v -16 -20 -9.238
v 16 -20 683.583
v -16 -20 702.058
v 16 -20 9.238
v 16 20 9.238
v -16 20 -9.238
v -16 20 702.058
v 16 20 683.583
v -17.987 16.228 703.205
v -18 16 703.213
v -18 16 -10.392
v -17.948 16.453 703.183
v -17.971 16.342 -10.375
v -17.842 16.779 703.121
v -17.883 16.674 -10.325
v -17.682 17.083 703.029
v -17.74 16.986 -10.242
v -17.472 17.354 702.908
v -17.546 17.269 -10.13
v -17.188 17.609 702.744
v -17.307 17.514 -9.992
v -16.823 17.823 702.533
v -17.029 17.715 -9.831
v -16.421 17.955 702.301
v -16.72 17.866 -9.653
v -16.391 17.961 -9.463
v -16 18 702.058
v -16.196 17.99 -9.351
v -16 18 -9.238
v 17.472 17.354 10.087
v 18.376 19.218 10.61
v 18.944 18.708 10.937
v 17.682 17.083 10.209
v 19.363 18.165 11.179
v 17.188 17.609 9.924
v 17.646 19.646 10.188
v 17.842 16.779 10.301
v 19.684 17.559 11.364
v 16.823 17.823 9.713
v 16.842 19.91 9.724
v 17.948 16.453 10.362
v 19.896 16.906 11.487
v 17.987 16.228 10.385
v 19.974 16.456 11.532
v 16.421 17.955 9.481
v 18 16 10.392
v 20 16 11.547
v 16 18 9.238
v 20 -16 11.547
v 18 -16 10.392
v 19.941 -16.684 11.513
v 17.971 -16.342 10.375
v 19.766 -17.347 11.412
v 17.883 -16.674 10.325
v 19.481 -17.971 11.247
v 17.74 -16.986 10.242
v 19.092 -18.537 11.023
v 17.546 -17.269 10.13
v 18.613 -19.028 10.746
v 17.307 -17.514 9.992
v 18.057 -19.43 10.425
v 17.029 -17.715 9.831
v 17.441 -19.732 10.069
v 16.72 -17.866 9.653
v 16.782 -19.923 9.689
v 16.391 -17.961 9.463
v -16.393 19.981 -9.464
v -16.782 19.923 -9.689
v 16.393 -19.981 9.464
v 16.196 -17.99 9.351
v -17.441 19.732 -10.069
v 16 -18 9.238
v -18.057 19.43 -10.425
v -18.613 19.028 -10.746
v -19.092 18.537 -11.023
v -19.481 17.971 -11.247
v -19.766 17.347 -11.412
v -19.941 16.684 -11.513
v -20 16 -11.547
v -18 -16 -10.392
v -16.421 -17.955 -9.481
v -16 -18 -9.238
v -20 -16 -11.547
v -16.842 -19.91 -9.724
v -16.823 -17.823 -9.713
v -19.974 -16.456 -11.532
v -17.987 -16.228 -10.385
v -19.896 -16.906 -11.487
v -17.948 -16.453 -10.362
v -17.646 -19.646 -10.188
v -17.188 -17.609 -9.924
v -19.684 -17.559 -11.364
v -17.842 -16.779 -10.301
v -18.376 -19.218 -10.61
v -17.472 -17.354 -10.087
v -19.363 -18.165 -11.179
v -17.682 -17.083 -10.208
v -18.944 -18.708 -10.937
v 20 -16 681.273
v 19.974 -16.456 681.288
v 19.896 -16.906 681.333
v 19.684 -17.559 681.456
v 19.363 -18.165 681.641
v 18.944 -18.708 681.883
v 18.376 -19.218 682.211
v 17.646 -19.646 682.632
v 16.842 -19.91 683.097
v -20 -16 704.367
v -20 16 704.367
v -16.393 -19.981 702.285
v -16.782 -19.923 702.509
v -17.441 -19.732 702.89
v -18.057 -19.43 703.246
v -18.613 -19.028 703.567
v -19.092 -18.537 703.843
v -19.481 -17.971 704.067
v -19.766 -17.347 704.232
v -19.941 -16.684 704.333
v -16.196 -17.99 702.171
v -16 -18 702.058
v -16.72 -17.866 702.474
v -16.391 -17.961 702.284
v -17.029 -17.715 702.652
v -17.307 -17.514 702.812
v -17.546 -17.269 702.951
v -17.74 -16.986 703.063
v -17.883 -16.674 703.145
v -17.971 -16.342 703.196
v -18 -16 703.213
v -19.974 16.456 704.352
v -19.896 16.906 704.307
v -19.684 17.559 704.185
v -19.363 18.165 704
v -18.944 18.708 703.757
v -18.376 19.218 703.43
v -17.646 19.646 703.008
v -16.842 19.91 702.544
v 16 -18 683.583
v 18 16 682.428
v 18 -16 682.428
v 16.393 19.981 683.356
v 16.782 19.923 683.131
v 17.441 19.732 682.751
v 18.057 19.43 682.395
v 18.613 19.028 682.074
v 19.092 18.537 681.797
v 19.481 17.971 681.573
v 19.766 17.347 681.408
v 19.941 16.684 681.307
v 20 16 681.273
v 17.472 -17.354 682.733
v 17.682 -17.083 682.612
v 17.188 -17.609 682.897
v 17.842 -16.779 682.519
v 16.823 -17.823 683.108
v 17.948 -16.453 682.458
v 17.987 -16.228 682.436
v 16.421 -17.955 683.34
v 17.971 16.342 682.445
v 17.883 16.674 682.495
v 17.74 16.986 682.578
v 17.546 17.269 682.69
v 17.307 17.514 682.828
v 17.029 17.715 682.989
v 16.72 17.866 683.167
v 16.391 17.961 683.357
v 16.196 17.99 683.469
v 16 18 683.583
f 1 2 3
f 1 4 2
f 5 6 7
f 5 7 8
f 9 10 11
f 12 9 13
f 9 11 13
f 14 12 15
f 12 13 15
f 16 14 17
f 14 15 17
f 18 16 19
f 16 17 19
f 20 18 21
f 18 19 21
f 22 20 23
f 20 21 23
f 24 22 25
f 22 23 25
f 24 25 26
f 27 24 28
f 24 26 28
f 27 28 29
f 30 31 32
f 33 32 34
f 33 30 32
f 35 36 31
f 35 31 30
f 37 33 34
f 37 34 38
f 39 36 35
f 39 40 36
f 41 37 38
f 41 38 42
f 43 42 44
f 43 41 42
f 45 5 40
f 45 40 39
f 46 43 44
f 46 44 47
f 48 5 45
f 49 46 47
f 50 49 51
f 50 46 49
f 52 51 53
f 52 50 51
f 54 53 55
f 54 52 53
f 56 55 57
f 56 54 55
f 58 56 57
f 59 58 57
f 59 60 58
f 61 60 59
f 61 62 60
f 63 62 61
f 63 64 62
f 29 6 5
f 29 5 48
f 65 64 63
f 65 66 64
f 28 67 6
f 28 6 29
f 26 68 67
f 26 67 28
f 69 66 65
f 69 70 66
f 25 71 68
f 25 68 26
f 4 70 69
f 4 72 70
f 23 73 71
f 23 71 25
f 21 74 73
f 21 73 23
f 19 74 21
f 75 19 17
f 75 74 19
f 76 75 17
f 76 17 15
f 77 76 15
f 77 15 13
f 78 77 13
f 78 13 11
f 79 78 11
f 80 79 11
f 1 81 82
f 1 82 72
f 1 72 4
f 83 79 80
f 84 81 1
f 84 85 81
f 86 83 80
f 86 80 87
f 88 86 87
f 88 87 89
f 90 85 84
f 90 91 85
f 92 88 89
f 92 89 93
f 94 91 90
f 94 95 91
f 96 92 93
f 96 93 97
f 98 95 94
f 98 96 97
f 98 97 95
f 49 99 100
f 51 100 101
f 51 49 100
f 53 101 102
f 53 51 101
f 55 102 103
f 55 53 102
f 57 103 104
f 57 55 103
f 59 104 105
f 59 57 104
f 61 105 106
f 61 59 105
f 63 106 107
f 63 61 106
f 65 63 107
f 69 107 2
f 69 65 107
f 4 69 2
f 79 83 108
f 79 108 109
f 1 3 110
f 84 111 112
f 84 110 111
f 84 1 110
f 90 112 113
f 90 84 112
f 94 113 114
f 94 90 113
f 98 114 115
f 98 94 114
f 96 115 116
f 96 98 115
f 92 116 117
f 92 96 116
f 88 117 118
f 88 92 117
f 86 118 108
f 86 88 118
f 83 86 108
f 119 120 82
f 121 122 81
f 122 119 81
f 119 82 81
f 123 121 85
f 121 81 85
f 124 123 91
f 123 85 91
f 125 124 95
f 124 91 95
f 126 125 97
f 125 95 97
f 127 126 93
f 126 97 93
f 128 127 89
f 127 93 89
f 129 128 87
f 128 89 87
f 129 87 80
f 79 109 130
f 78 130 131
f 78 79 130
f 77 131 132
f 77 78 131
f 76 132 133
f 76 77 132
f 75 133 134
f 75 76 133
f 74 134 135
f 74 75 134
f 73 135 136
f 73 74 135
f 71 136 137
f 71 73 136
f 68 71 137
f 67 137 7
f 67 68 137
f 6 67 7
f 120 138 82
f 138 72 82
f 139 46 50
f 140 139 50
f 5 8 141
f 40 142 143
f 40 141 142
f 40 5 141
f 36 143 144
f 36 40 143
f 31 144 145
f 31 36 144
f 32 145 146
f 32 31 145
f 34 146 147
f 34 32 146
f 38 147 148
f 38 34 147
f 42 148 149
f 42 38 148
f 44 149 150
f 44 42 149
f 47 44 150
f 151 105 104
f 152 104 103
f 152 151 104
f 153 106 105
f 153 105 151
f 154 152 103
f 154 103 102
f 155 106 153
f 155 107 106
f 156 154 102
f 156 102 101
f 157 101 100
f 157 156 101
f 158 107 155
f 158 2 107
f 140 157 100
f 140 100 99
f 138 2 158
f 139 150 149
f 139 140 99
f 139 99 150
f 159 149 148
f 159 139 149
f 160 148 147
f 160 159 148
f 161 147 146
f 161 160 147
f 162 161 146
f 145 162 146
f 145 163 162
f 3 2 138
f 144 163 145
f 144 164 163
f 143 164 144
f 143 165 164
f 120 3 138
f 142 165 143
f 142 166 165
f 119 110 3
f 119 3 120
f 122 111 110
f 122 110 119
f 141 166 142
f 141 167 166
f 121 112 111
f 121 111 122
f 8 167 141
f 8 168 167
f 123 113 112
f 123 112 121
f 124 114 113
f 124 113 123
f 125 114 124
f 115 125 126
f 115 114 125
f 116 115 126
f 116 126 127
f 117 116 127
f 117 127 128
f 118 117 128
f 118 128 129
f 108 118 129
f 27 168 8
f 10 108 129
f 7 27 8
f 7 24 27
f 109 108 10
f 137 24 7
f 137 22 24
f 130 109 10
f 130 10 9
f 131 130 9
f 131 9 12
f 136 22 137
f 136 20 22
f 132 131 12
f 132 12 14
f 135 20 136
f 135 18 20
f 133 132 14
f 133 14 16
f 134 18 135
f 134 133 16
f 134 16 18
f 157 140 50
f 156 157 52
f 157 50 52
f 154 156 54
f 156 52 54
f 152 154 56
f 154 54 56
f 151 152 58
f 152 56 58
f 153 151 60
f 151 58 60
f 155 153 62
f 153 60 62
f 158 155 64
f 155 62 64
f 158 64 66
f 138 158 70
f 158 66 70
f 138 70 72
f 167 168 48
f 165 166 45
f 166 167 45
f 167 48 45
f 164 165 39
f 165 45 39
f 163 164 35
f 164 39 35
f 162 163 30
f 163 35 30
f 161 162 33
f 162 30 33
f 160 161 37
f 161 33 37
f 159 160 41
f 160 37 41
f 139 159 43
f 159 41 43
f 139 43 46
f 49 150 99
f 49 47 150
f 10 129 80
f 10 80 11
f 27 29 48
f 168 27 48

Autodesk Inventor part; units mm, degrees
ref_plane "Start Plane" through (0, 0, -11.547) normal (0, 0, 1) x (1, 0, 0)
ref_plane "End Plane" through (0, 0, 704.3673) normal (0, 0, 1) x (1, 0, 0)
sketch "Sketch" plane through (0, 0, 0) normal (0, 0, 1) x (1, 0, 0)
  line L0 (-20, -16) -> (-20, 16)
  line L1 (-16, 20) -> (16, 20)
  line L2 (20, 16) -> (20, -16)
  line L3 (16, -20) -> (-16, -20)
  arc A0 (-20, -16) -> (-16, -20) centre (-16, -16) ccw
  arc A1 (20, 16) -> (16, 20) centre (16, 16) ccw
  arc A2 (-16, 20) -> (-20, 16) centre (-16, 16) ccw
  arc A3 (16, -20) -> (20, -16) centre (16, -16) ccw
  arc A4 (-16, 18) -> (-18, 16) centre (-16, 16) ccw
  line L4 (-16, 18) -> (16, 18)
  arc A5 (18, 16) -> (16, 18) centre (16, 16) ccw
  line L5 (18, 16) -> (18, -16)
  arc A6 (16, -18) -> (18, -16) centre (16, -16) ccw
  line L6 (16, -18) -> (-16, -18)
  arc A7 (-18, -16) -> (-16, -18) centre (-16, -16) ccw
  line L7 (-18, -16) -> (-18, 16)
  line L8 (0, 29.1598) -> (0, -29.1598) construction
  line L9 (-29.1598, 0) -> (29.1598, 0) construction
  dimension "d7" = 4
  dimension "d9" = 40
  dimension "d11" = 40
  dimension "d12" = 2
  dimension "d15" = 20
  dimension "d16" = 20
extrude "Body" add sketch "Sketch" along normal up to surface (715.9143 mm away) from surface at -11.547
sketch "Sketch3" plane through (0, 0, 0) normal (0, 0, 1) x (1, 0, 0)
  line L0 (0, 0) -> (10, 0)
ref_plane "Work Plane3" through (0, 0, 0) normal (0, -1, 0) x (1, 0, 0)
sketch "Sketch4" plane through (0, 0, 0) normal (0, -1, 0) x (1, 0, 0)
  line L0 (-2, -11.547) -> (12, -11.547)
  line L1 (-2, 704.3673) -> (12, 704.3673)
  dimension "d18" = 715.9143
ref_plane "Work Plane4" through (-20, 0, -11.547) normal (0.5, 0, -0.866) x (-0.866, 0, -0.5)
split "Split1" plane through (-20, 0, -11.547) removes the side toward (0.5, 0, -0.866)
ref_plane "Work Plane5" through (-20, 0, 704.3673) normal (0.5, 0, 0.866) x (0.866, 0, -0.5)
split "Split2" plane through (-20, 0, 704.3673) removes the side toward (0.5, 0, 0.866)
equation "\"d7\" = G_IR"
equation "\"d9\" = G_W"
equation "\"d11\" = G_H"
equation "\"d12\" = G_T"
equation "\"d15\" = 0.5 * d9"
equation "\"d16\" = 0.5 * d11"
equation "\"d3\" = G_L"
equation "\"G_W\" = 40"
equation "\"G_H\" = 40"
equation "\"G_T\" = 2"
equation "\"G_IR\" = 4"
equation "\"G_L\" = d18"
equation "\"G_OFFSET_START\" = 11.54701"
equation "\"G_OFFSET_END\" = 11.54701"
equation "\"d13\" = -G_OFFSET_START"
equation "\"d14\" = G_OFFSET_END + B_L"
equation "\"B_L\" = 692.82032"
properties part number "ISO 10799-2 - 40x40x2 - 715,91" material "Steel, Mild"
